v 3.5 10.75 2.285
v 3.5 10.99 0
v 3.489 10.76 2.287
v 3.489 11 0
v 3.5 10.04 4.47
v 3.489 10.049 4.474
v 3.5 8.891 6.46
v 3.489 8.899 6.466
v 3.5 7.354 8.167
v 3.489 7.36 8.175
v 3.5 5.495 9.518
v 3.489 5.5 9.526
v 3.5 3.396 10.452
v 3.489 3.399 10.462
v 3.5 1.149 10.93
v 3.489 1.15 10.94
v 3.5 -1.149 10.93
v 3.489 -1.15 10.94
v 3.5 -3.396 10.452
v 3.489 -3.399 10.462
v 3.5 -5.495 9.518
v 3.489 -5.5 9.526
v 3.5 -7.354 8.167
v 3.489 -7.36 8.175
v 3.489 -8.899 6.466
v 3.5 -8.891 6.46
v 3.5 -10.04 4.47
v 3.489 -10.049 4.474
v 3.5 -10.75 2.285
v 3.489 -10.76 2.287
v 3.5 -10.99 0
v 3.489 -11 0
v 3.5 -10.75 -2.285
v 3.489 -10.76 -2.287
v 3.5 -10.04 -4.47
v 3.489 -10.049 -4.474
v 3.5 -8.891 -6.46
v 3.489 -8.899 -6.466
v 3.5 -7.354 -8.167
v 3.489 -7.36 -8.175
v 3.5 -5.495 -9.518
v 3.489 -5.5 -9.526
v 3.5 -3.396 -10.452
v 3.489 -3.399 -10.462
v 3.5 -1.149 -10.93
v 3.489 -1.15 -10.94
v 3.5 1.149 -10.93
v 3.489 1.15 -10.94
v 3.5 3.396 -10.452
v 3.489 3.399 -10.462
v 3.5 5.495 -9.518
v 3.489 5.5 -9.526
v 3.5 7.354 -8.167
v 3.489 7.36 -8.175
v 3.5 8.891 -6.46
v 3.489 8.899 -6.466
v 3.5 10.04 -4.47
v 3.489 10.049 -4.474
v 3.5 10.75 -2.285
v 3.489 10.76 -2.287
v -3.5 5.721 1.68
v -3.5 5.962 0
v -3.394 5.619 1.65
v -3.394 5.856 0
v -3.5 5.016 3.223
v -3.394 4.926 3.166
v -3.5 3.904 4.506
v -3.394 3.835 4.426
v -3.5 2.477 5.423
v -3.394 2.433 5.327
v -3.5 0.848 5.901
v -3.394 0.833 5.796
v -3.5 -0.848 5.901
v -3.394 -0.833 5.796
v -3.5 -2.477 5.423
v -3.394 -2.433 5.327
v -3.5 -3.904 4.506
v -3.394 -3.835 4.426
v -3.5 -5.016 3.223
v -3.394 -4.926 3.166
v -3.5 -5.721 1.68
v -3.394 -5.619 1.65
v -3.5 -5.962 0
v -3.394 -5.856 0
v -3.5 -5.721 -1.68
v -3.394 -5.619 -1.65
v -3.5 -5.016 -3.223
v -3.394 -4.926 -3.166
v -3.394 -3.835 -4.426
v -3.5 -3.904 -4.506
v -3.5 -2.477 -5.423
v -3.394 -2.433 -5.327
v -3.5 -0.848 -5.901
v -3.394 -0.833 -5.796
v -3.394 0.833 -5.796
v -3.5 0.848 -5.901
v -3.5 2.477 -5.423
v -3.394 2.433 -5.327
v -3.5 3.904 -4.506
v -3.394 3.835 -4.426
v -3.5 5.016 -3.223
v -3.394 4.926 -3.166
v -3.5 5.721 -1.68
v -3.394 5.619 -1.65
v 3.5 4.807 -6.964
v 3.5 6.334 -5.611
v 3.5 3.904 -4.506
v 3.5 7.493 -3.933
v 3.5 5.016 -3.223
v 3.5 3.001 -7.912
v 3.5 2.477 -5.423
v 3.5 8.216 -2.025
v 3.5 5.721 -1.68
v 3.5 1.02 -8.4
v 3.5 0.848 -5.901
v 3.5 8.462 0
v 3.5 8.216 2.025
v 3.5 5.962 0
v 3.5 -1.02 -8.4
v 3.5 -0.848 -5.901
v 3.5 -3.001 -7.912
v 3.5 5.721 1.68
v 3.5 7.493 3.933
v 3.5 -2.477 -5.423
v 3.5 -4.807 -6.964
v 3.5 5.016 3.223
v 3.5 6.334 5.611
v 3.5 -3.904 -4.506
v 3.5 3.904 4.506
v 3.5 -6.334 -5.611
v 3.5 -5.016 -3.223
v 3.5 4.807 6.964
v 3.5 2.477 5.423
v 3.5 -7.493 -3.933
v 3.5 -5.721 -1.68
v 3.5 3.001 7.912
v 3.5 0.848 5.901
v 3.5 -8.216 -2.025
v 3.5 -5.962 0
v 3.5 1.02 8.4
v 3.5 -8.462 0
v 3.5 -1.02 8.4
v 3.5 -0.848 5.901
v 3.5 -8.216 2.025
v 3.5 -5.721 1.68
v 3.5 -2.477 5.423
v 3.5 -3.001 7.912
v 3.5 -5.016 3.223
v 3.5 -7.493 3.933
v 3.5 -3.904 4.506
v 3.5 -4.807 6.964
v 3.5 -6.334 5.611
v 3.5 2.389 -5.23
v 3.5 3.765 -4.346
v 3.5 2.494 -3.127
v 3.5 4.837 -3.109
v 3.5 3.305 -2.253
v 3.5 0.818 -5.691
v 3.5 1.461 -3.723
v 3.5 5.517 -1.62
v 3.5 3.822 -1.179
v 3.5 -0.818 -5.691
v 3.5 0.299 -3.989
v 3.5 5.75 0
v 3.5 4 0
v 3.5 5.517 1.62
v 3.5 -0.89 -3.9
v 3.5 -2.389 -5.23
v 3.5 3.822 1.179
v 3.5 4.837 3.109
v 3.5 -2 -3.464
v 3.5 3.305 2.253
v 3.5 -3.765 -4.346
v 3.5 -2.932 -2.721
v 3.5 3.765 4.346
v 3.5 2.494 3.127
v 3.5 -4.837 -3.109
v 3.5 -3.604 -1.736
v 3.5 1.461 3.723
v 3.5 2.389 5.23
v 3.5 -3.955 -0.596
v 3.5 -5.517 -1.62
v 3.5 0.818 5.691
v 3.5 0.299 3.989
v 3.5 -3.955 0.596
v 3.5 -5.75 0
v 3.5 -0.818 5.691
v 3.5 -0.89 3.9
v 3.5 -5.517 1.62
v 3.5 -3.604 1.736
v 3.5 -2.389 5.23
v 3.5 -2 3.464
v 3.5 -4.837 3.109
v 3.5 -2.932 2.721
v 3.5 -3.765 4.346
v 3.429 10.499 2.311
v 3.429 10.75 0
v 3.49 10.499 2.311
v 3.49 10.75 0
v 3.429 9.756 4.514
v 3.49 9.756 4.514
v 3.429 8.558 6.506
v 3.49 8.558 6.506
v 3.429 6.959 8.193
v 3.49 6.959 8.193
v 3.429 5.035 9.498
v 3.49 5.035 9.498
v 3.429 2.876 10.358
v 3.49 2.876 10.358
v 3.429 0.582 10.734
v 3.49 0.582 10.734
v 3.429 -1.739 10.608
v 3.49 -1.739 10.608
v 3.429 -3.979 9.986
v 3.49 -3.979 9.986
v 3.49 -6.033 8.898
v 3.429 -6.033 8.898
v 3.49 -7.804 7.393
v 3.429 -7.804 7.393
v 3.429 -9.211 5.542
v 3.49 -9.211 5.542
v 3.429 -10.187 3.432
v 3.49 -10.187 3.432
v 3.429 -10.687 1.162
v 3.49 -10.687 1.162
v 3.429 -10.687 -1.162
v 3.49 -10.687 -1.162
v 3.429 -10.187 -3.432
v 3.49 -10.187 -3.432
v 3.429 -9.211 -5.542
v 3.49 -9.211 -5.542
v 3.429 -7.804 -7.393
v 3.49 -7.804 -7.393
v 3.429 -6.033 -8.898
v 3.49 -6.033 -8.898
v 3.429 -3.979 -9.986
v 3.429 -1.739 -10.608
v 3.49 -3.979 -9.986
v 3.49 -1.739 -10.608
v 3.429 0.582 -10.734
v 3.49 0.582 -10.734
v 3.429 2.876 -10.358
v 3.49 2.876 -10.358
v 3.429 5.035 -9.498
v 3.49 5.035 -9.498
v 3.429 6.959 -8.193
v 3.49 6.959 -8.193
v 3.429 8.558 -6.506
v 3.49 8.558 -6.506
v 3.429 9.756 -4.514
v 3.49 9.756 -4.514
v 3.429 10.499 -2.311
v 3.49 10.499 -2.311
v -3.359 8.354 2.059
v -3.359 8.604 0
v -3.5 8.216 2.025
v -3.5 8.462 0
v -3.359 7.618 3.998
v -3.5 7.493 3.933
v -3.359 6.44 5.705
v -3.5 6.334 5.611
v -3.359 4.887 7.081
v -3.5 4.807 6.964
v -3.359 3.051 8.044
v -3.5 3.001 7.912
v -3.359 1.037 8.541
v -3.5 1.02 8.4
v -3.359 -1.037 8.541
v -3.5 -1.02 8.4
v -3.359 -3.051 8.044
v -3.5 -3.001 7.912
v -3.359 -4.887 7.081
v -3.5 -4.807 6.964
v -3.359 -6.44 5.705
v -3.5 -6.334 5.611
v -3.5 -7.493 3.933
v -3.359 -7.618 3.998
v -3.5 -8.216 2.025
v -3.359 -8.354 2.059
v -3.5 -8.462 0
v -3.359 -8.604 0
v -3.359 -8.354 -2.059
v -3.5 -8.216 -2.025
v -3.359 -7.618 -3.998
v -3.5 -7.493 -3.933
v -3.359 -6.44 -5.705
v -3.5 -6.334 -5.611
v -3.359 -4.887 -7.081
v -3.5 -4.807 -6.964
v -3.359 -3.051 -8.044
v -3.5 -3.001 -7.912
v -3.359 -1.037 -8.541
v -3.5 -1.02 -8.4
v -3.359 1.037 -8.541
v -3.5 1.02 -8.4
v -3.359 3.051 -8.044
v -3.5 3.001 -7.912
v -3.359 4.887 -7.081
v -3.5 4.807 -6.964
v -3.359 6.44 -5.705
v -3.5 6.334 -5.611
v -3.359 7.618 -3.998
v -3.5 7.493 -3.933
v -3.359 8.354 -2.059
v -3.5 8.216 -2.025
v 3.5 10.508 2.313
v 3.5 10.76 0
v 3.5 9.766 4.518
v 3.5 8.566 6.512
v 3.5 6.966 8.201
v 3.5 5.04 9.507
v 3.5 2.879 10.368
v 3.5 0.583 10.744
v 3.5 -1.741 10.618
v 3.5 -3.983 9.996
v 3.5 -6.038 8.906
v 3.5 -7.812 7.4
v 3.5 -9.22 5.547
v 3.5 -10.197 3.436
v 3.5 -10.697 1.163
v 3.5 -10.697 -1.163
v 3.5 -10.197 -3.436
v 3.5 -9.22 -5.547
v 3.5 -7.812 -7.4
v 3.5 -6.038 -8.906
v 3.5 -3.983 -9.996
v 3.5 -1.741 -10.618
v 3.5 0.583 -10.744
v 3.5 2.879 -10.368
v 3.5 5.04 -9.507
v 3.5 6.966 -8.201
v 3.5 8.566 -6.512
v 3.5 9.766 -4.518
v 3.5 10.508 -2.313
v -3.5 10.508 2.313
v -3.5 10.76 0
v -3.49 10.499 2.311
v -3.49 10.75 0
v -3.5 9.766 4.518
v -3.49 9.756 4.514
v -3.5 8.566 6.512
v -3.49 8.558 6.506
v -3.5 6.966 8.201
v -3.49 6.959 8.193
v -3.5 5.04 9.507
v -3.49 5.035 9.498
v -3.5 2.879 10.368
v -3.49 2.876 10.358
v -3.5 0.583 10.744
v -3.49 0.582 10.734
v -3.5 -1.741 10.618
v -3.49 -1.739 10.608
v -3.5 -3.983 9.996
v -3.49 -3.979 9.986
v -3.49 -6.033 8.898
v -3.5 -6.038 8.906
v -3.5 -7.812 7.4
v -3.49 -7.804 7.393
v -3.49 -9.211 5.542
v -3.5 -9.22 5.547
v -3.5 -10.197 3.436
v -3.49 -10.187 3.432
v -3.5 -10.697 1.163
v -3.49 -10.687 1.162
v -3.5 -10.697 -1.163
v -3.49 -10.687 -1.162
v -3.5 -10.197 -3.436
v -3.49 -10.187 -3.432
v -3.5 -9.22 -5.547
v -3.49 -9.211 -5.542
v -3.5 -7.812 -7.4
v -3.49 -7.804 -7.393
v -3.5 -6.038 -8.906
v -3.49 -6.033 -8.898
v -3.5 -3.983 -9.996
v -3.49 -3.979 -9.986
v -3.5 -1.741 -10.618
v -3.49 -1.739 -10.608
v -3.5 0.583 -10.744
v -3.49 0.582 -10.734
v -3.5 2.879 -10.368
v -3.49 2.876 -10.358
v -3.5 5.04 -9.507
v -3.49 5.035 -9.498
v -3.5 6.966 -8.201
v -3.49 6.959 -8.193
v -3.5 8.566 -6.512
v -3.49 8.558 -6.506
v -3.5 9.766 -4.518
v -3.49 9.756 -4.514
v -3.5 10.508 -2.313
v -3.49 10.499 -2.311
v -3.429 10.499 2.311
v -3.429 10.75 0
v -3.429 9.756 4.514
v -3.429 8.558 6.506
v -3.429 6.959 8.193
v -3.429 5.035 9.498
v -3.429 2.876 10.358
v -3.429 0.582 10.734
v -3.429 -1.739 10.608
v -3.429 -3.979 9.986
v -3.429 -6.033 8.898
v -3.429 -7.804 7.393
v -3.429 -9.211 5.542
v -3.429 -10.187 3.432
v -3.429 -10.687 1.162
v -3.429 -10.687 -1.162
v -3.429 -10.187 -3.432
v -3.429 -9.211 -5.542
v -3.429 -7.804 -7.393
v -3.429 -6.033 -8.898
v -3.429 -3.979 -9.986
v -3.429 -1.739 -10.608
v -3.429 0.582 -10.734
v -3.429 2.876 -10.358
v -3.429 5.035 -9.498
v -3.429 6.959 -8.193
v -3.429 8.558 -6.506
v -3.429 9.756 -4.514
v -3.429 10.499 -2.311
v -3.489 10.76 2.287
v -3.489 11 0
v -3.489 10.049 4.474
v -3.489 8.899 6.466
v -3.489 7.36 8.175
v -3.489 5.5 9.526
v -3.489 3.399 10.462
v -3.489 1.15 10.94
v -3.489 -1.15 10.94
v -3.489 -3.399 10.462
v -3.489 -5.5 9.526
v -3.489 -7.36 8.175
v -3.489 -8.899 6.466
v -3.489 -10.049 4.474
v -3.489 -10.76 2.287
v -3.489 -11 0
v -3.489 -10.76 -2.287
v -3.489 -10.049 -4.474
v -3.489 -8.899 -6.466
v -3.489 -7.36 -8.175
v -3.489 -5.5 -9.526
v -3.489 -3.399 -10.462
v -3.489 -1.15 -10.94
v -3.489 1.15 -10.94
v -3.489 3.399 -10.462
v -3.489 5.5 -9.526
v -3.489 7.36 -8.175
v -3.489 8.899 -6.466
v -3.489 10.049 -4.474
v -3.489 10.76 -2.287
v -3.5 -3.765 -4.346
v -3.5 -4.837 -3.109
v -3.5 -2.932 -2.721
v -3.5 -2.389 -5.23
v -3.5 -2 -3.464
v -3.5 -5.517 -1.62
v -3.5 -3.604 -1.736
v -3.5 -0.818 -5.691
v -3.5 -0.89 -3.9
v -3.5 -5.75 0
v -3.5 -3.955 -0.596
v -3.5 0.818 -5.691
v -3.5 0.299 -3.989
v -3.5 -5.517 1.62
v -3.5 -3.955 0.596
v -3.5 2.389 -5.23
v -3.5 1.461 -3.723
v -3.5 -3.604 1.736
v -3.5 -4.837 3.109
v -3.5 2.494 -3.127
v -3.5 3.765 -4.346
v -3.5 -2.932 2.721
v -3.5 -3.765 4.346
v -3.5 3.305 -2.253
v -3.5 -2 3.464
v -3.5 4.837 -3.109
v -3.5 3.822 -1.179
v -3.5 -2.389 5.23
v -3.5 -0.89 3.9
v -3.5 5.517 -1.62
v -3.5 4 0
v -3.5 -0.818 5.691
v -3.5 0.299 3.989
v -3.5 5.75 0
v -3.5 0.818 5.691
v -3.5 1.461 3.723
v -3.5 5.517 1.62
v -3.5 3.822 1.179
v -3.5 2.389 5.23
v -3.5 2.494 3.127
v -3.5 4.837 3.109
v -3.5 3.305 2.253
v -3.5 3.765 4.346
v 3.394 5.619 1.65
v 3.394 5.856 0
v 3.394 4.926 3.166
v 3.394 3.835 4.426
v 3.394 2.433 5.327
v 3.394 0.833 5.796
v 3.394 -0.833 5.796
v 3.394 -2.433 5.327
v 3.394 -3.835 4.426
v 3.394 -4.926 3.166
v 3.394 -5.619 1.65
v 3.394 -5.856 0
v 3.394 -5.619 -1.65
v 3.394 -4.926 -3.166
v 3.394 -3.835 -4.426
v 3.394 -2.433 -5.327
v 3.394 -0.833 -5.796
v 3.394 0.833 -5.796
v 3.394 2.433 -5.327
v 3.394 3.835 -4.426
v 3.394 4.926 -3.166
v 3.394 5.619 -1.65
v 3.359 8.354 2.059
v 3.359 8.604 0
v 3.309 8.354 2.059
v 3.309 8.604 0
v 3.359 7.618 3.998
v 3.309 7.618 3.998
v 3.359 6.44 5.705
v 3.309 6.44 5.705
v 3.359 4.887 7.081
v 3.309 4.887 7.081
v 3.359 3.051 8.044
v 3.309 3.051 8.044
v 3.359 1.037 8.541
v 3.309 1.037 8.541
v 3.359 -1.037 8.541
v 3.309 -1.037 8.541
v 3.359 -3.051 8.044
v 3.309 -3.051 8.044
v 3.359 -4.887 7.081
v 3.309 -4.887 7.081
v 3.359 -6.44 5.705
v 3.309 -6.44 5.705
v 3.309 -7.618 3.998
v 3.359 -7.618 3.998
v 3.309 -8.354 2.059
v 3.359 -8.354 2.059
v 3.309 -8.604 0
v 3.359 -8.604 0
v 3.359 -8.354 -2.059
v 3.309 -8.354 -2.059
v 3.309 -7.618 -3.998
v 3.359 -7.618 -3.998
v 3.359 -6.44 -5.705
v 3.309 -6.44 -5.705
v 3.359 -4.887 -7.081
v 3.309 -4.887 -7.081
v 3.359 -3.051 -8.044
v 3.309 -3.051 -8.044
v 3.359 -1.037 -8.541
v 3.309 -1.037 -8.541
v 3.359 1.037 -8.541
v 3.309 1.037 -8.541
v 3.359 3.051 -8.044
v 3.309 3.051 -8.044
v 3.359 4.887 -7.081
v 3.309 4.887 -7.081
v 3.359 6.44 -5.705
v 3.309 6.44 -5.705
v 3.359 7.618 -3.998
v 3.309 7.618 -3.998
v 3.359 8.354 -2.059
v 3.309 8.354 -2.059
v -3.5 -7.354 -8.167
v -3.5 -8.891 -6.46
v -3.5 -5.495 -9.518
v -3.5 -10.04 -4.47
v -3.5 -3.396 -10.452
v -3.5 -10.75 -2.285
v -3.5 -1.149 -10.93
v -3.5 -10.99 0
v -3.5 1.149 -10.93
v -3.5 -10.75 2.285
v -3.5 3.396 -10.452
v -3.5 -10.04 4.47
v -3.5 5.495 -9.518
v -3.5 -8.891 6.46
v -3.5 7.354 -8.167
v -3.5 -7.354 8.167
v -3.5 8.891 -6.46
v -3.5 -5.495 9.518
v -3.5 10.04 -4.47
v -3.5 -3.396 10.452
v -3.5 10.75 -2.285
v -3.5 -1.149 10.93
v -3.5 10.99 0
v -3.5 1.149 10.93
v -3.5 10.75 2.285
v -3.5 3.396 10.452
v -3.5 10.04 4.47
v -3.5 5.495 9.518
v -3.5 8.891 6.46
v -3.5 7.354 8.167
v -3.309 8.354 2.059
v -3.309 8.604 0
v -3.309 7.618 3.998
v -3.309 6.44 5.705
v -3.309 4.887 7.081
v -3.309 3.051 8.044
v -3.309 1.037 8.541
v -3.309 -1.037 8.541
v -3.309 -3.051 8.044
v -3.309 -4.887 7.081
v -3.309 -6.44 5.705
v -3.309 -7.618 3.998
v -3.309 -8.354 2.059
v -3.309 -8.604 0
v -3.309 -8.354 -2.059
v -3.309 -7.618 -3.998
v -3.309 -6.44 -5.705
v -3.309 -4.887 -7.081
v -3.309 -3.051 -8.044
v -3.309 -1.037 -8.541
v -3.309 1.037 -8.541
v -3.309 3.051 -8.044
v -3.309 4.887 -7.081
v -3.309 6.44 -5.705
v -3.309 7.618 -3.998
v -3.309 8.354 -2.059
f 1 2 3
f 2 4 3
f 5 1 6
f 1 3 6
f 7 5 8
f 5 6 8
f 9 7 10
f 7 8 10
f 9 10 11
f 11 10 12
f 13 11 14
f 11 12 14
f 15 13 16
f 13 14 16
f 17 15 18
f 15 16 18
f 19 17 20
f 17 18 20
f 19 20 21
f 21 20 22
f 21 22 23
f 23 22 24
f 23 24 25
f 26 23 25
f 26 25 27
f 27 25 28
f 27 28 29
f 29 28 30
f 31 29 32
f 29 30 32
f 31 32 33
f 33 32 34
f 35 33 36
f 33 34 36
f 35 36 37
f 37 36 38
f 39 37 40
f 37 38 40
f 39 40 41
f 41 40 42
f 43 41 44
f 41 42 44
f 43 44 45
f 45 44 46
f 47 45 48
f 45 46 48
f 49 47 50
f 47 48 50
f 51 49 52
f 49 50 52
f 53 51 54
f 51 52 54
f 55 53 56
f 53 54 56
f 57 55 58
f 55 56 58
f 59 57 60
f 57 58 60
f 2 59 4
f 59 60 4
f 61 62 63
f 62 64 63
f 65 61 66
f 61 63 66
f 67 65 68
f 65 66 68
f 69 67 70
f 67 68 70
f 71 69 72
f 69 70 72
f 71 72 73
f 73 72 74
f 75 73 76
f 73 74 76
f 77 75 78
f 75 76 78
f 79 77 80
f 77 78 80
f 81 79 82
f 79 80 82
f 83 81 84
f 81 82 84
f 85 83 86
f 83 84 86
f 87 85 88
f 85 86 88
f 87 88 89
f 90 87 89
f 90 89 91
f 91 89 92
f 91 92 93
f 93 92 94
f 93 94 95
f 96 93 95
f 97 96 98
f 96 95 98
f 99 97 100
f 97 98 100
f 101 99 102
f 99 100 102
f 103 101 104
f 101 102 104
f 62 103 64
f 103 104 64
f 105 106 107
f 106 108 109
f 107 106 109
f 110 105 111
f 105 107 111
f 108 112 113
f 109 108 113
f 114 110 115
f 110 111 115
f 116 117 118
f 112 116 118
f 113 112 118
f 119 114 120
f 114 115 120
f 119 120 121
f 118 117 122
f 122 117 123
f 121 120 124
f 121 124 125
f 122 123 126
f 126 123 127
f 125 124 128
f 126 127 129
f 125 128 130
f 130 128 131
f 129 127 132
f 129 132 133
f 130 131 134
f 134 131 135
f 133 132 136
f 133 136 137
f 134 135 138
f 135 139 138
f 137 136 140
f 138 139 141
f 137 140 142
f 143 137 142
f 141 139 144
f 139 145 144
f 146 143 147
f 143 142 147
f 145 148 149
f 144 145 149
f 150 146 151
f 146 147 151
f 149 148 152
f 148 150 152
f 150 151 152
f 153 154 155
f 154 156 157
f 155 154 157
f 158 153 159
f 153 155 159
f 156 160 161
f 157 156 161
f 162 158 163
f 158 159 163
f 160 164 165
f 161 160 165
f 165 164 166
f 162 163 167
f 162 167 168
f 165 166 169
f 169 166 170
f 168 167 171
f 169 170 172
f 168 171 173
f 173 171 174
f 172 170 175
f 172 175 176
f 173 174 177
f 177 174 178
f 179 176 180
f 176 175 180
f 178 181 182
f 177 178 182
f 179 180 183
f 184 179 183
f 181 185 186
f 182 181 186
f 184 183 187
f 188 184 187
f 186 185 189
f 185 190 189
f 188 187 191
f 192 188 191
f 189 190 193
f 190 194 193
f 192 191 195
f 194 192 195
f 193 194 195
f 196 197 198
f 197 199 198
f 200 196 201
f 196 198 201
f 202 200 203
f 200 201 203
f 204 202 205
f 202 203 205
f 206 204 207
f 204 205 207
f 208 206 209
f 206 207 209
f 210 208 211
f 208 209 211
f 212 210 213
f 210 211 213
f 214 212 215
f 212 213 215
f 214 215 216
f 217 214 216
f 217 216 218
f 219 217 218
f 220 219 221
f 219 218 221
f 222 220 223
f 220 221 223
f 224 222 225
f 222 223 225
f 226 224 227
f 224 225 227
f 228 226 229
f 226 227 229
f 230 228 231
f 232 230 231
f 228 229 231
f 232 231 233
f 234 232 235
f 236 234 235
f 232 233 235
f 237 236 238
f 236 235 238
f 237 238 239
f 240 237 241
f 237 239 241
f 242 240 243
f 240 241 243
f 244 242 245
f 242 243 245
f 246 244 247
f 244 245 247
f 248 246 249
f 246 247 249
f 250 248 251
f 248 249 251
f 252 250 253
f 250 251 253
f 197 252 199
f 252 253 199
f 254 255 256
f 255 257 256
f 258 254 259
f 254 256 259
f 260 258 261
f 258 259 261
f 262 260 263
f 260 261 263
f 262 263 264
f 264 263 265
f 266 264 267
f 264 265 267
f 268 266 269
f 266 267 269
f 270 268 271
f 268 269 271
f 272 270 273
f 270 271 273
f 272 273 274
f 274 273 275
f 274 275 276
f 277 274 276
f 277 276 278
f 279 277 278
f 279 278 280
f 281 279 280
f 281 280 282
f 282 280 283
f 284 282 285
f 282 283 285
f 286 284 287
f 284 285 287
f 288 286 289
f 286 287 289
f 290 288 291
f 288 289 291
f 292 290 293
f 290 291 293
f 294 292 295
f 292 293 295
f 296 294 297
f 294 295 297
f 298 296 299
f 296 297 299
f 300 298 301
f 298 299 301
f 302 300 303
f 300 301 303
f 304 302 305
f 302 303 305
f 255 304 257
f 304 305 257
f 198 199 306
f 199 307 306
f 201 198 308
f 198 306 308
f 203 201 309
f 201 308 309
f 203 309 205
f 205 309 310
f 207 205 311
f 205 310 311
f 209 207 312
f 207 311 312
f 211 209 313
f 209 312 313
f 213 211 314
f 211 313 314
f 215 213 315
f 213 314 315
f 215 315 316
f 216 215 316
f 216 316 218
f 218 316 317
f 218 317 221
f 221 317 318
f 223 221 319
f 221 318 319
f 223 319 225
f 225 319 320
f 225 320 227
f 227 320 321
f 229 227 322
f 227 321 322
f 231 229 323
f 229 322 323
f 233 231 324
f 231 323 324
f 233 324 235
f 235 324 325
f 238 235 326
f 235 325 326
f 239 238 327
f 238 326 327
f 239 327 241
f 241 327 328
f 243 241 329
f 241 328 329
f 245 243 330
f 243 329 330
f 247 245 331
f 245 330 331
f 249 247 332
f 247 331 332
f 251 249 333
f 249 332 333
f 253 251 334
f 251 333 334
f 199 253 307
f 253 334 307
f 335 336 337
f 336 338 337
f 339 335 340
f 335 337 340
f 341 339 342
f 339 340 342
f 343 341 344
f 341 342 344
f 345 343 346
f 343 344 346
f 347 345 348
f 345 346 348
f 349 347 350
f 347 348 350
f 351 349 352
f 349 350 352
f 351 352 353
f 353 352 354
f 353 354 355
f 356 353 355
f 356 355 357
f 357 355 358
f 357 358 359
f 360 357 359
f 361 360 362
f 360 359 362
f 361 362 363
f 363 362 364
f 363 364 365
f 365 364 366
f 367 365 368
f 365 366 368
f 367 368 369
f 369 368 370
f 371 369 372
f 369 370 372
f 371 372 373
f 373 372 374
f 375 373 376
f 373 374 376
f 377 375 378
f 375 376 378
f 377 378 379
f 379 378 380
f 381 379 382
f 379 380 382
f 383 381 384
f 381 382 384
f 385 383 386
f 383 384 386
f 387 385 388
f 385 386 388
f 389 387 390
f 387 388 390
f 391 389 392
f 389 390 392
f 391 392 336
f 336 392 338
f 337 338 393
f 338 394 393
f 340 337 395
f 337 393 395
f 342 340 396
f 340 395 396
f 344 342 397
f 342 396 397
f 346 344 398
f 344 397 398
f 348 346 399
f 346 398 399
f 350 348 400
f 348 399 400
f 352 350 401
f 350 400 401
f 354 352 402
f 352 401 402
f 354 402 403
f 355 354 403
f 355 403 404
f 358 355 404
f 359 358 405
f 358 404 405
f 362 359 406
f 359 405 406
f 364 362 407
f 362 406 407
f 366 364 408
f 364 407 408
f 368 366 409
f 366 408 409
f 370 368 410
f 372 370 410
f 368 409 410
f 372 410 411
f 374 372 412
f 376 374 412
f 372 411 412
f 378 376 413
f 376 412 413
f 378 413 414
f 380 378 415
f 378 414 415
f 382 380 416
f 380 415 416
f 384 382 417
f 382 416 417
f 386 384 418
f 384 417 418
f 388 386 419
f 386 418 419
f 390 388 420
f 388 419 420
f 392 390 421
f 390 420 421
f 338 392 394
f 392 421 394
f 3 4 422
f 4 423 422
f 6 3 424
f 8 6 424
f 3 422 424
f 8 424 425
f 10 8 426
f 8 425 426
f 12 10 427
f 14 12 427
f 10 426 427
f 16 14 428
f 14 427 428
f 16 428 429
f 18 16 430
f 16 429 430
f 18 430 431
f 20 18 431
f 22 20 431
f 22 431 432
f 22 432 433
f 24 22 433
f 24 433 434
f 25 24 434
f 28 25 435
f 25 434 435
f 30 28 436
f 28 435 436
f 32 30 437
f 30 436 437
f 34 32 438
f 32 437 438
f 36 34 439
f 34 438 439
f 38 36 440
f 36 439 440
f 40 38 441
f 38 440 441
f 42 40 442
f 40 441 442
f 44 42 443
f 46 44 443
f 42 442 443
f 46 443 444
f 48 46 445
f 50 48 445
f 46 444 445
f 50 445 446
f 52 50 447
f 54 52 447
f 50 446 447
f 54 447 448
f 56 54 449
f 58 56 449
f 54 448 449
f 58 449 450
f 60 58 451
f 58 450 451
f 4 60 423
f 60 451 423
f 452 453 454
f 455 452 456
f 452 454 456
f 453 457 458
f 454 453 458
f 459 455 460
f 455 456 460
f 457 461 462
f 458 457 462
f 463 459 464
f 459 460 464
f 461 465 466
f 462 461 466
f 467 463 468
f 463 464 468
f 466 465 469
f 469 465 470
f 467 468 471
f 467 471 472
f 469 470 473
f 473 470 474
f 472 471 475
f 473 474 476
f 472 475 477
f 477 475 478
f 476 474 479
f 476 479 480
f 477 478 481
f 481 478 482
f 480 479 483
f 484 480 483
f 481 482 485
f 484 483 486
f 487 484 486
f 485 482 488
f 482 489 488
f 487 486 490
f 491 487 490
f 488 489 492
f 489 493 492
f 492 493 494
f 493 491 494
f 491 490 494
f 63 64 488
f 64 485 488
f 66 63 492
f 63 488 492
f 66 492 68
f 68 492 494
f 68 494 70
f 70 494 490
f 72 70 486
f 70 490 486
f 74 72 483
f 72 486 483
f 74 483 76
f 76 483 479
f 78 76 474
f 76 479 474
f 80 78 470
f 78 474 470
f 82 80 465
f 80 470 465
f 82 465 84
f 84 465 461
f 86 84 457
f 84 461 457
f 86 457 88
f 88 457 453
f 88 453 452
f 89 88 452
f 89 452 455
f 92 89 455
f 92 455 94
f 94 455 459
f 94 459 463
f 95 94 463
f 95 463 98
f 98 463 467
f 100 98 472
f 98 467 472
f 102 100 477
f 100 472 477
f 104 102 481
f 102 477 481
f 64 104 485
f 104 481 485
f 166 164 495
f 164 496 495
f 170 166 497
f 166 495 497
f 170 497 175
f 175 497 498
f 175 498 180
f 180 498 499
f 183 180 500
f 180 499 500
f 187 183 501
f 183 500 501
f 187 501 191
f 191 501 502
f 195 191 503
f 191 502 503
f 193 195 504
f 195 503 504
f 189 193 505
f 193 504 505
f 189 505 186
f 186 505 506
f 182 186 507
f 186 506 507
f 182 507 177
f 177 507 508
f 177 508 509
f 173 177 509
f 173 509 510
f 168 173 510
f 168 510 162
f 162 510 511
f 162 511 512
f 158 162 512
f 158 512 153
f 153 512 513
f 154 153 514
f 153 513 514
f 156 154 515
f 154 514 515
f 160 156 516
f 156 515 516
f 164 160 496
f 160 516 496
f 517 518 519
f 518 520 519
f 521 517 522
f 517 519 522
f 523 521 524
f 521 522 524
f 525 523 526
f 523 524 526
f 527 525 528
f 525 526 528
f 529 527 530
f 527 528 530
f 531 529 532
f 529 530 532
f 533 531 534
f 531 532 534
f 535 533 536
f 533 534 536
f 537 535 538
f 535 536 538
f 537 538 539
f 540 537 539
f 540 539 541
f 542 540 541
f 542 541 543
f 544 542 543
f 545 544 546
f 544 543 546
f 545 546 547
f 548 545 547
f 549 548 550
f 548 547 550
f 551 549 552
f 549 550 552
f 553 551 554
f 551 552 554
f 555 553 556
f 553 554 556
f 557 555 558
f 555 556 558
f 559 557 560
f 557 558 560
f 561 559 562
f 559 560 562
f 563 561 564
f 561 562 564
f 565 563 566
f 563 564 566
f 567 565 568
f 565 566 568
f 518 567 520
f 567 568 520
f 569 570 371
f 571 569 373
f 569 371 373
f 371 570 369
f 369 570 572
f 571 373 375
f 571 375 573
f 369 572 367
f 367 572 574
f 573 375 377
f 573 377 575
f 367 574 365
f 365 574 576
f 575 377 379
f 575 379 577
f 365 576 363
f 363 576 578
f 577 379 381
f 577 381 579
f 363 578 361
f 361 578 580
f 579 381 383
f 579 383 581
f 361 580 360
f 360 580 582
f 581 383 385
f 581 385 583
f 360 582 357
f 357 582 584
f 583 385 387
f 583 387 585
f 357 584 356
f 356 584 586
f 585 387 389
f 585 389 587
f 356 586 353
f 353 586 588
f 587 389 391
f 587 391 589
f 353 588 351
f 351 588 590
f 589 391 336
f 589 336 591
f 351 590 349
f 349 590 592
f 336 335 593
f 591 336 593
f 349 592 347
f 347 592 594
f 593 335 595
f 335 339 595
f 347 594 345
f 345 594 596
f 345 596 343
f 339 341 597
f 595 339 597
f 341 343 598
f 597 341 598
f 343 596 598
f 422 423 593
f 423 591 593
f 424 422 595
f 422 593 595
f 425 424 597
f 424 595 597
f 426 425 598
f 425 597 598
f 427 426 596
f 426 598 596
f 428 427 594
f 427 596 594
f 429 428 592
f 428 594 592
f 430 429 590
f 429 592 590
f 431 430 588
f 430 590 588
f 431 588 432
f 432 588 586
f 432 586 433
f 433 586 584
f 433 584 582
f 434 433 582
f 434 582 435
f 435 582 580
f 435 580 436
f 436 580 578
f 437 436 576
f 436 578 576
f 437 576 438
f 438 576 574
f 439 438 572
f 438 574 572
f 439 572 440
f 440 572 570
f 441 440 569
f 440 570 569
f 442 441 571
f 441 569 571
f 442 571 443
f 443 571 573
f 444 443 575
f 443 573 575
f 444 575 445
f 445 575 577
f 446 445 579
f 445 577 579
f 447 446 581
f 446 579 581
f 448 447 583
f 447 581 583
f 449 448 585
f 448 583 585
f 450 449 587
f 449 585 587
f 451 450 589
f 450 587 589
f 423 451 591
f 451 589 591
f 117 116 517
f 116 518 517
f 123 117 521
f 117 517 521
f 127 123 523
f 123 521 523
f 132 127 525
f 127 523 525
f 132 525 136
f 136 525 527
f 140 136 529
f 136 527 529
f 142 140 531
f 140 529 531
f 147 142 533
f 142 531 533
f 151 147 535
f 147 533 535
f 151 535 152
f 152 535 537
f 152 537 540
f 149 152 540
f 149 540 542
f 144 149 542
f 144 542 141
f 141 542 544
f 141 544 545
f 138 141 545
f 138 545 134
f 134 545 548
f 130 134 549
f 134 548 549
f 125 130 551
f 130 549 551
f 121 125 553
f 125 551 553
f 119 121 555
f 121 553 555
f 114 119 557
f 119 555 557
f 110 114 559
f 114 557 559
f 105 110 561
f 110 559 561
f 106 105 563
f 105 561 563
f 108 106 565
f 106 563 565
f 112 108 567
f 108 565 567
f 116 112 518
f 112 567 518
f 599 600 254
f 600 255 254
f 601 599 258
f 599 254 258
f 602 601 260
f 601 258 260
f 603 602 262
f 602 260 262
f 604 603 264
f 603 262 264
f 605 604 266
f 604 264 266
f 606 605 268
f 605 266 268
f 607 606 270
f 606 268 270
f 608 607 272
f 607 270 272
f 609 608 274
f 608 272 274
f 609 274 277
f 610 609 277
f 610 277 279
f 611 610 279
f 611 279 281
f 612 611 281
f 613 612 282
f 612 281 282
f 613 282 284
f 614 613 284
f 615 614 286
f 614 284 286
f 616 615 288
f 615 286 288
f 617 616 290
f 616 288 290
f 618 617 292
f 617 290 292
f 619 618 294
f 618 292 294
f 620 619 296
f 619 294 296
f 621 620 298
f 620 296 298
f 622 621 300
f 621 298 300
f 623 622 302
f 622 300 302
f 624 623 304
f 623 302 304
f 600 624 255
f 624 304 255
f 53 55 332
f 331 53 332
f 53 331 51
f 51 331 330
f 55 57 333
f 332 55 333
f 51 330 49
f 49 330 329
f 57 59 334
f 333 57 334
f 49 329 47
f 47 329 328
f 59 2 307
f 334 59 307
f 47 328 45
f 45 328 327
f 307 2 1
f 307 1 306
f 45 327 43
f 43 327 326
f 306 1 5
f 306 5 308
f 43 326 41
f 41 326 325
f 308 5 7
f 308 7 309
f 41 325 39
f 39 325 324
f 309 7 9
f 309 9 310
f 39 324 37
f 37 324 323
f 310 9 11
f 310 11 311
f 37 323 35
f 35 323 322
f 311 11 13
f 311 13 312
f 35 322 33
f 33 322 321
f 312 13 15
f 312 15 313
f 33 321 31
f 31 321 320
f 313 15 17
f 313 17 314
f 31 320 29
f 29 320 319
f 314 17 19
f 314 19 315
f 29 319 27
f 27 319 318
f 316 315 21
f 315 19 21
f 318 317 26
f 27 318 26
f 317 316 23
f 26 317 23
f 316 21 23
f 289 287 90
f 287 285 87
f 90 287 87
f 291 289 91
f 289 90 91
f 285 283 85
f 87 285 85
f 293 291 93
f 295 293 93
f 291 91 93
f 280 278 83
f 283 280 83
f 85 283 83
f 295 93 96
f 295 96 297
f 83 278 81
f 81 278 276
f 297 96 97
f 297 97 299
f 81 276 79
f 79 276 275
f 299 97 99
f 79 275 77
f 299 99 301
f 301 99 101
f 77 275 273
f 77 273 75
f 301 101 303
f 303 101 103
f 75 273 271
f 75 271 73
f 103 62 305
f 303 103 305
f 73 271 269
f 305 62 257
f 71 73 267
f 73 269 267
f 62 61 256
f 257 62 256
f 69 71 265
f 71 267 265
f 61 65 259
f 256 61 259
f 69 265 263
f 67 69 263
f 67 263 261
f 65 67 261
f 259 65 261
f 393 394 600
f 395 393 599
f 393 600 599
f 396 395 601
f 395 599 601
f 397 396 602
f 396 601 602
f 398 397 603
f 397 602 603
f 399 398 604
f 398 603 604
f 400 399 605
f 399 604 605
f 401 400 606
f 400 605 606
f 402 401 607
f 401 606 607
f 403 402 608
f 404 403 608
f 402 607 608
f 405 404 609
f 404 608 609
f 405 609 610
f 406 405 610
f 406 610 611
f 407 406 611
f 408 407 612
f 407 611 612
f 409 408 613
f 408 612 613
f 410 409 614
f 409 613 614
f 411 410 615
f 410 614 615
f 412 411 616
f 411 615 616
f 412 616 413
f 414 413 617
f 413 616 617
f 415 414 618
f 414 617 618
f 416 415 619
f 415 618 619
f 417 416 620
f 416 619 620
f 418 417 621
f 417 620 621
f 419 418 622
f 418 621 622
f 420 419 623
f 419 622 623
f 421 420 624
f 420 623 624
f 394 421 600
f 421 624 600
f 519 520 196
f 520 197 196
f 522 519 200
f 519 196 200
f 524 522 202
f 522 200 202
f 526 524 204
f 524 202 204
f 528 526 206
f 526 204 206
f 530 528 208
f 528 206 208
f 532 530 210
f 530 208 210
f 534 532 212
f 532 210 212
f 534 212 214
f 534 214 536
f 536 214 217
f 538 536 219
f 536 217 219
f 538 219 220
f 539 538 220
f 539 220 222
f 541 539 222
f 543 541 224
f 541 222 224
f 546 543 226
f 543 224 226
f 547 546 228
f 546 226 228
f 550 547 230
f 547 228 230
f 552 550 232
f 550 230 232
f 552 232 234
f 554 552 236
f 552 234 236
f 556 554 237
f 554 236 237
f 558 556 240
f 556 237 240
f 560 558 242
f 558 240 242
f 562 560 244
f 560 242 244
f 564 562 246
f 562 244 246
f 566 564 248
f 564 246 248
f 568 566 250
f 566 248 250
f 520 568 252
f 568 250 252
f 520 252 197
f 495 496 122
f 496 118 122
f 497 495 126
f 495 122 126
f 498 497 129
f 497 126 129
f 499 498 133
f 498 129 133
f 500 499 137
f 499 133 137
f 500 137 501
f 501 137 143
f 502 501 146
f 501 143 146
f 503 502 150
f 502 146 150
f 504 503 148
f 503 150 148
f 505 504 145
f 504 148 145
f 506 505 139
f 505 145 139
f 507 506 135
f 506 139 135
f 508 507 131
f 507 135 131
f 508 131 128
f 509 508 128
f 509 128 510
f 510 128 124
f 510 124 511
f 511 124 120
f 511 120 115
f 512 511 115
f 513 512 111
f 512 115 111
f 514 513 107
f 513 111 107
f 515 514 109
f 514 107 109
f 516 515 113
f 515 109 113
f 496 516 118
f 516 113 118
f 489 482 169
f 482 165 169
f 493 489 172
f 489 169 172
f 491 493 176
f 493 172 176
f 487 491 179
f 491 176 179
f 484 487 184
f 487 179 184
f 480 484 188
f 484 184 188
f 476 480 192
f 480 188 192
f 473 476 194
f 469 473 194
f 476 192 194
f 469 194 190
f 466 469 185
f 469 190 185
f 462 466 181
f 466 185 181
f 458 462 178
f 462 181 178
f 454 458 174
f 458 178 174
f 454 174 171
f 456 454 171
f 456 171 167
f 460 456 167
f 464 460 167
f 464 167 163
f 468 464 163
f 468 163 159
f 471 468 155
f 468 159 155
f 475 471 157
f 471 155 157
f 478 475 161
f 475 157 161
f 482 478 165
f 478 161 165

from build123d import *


with BuildPart() as part:
    # Sketch1 → Revolve1 (revolve)
    with BuildSketch(Plane.XY):
        Polygon((-3.5, 4), (3.5, 4), (3.5, 5.75), (3.393933983, 5.856066017), (3.5, 5.962132034), (3.5, 8.462132034), (3.358578644, 8.603553391), (3.308578644, 8.603553391), (3.429289322, 10.75), (3.49, 10.75), (3.5, 10.76), (3.5, 10.99), (3.489185937, 11), (-3.489185937, 11), (-3.5, 10.99), (-3.5, 10.76), (-3.49, 10.75), (-3.429289322, 10.75), (-3.308578644, 8.603553391), (-3.358578644, 8.603553391), (-3.5, 8.462132034), (-3.5, 5.962132034), (-3.393933983, 5.856066017), (-3.5, 5.75), align=None)
    revolve(axis=Axis((-0.54284752, 0, 0), (1, 0, 0)))


solid = part.part
